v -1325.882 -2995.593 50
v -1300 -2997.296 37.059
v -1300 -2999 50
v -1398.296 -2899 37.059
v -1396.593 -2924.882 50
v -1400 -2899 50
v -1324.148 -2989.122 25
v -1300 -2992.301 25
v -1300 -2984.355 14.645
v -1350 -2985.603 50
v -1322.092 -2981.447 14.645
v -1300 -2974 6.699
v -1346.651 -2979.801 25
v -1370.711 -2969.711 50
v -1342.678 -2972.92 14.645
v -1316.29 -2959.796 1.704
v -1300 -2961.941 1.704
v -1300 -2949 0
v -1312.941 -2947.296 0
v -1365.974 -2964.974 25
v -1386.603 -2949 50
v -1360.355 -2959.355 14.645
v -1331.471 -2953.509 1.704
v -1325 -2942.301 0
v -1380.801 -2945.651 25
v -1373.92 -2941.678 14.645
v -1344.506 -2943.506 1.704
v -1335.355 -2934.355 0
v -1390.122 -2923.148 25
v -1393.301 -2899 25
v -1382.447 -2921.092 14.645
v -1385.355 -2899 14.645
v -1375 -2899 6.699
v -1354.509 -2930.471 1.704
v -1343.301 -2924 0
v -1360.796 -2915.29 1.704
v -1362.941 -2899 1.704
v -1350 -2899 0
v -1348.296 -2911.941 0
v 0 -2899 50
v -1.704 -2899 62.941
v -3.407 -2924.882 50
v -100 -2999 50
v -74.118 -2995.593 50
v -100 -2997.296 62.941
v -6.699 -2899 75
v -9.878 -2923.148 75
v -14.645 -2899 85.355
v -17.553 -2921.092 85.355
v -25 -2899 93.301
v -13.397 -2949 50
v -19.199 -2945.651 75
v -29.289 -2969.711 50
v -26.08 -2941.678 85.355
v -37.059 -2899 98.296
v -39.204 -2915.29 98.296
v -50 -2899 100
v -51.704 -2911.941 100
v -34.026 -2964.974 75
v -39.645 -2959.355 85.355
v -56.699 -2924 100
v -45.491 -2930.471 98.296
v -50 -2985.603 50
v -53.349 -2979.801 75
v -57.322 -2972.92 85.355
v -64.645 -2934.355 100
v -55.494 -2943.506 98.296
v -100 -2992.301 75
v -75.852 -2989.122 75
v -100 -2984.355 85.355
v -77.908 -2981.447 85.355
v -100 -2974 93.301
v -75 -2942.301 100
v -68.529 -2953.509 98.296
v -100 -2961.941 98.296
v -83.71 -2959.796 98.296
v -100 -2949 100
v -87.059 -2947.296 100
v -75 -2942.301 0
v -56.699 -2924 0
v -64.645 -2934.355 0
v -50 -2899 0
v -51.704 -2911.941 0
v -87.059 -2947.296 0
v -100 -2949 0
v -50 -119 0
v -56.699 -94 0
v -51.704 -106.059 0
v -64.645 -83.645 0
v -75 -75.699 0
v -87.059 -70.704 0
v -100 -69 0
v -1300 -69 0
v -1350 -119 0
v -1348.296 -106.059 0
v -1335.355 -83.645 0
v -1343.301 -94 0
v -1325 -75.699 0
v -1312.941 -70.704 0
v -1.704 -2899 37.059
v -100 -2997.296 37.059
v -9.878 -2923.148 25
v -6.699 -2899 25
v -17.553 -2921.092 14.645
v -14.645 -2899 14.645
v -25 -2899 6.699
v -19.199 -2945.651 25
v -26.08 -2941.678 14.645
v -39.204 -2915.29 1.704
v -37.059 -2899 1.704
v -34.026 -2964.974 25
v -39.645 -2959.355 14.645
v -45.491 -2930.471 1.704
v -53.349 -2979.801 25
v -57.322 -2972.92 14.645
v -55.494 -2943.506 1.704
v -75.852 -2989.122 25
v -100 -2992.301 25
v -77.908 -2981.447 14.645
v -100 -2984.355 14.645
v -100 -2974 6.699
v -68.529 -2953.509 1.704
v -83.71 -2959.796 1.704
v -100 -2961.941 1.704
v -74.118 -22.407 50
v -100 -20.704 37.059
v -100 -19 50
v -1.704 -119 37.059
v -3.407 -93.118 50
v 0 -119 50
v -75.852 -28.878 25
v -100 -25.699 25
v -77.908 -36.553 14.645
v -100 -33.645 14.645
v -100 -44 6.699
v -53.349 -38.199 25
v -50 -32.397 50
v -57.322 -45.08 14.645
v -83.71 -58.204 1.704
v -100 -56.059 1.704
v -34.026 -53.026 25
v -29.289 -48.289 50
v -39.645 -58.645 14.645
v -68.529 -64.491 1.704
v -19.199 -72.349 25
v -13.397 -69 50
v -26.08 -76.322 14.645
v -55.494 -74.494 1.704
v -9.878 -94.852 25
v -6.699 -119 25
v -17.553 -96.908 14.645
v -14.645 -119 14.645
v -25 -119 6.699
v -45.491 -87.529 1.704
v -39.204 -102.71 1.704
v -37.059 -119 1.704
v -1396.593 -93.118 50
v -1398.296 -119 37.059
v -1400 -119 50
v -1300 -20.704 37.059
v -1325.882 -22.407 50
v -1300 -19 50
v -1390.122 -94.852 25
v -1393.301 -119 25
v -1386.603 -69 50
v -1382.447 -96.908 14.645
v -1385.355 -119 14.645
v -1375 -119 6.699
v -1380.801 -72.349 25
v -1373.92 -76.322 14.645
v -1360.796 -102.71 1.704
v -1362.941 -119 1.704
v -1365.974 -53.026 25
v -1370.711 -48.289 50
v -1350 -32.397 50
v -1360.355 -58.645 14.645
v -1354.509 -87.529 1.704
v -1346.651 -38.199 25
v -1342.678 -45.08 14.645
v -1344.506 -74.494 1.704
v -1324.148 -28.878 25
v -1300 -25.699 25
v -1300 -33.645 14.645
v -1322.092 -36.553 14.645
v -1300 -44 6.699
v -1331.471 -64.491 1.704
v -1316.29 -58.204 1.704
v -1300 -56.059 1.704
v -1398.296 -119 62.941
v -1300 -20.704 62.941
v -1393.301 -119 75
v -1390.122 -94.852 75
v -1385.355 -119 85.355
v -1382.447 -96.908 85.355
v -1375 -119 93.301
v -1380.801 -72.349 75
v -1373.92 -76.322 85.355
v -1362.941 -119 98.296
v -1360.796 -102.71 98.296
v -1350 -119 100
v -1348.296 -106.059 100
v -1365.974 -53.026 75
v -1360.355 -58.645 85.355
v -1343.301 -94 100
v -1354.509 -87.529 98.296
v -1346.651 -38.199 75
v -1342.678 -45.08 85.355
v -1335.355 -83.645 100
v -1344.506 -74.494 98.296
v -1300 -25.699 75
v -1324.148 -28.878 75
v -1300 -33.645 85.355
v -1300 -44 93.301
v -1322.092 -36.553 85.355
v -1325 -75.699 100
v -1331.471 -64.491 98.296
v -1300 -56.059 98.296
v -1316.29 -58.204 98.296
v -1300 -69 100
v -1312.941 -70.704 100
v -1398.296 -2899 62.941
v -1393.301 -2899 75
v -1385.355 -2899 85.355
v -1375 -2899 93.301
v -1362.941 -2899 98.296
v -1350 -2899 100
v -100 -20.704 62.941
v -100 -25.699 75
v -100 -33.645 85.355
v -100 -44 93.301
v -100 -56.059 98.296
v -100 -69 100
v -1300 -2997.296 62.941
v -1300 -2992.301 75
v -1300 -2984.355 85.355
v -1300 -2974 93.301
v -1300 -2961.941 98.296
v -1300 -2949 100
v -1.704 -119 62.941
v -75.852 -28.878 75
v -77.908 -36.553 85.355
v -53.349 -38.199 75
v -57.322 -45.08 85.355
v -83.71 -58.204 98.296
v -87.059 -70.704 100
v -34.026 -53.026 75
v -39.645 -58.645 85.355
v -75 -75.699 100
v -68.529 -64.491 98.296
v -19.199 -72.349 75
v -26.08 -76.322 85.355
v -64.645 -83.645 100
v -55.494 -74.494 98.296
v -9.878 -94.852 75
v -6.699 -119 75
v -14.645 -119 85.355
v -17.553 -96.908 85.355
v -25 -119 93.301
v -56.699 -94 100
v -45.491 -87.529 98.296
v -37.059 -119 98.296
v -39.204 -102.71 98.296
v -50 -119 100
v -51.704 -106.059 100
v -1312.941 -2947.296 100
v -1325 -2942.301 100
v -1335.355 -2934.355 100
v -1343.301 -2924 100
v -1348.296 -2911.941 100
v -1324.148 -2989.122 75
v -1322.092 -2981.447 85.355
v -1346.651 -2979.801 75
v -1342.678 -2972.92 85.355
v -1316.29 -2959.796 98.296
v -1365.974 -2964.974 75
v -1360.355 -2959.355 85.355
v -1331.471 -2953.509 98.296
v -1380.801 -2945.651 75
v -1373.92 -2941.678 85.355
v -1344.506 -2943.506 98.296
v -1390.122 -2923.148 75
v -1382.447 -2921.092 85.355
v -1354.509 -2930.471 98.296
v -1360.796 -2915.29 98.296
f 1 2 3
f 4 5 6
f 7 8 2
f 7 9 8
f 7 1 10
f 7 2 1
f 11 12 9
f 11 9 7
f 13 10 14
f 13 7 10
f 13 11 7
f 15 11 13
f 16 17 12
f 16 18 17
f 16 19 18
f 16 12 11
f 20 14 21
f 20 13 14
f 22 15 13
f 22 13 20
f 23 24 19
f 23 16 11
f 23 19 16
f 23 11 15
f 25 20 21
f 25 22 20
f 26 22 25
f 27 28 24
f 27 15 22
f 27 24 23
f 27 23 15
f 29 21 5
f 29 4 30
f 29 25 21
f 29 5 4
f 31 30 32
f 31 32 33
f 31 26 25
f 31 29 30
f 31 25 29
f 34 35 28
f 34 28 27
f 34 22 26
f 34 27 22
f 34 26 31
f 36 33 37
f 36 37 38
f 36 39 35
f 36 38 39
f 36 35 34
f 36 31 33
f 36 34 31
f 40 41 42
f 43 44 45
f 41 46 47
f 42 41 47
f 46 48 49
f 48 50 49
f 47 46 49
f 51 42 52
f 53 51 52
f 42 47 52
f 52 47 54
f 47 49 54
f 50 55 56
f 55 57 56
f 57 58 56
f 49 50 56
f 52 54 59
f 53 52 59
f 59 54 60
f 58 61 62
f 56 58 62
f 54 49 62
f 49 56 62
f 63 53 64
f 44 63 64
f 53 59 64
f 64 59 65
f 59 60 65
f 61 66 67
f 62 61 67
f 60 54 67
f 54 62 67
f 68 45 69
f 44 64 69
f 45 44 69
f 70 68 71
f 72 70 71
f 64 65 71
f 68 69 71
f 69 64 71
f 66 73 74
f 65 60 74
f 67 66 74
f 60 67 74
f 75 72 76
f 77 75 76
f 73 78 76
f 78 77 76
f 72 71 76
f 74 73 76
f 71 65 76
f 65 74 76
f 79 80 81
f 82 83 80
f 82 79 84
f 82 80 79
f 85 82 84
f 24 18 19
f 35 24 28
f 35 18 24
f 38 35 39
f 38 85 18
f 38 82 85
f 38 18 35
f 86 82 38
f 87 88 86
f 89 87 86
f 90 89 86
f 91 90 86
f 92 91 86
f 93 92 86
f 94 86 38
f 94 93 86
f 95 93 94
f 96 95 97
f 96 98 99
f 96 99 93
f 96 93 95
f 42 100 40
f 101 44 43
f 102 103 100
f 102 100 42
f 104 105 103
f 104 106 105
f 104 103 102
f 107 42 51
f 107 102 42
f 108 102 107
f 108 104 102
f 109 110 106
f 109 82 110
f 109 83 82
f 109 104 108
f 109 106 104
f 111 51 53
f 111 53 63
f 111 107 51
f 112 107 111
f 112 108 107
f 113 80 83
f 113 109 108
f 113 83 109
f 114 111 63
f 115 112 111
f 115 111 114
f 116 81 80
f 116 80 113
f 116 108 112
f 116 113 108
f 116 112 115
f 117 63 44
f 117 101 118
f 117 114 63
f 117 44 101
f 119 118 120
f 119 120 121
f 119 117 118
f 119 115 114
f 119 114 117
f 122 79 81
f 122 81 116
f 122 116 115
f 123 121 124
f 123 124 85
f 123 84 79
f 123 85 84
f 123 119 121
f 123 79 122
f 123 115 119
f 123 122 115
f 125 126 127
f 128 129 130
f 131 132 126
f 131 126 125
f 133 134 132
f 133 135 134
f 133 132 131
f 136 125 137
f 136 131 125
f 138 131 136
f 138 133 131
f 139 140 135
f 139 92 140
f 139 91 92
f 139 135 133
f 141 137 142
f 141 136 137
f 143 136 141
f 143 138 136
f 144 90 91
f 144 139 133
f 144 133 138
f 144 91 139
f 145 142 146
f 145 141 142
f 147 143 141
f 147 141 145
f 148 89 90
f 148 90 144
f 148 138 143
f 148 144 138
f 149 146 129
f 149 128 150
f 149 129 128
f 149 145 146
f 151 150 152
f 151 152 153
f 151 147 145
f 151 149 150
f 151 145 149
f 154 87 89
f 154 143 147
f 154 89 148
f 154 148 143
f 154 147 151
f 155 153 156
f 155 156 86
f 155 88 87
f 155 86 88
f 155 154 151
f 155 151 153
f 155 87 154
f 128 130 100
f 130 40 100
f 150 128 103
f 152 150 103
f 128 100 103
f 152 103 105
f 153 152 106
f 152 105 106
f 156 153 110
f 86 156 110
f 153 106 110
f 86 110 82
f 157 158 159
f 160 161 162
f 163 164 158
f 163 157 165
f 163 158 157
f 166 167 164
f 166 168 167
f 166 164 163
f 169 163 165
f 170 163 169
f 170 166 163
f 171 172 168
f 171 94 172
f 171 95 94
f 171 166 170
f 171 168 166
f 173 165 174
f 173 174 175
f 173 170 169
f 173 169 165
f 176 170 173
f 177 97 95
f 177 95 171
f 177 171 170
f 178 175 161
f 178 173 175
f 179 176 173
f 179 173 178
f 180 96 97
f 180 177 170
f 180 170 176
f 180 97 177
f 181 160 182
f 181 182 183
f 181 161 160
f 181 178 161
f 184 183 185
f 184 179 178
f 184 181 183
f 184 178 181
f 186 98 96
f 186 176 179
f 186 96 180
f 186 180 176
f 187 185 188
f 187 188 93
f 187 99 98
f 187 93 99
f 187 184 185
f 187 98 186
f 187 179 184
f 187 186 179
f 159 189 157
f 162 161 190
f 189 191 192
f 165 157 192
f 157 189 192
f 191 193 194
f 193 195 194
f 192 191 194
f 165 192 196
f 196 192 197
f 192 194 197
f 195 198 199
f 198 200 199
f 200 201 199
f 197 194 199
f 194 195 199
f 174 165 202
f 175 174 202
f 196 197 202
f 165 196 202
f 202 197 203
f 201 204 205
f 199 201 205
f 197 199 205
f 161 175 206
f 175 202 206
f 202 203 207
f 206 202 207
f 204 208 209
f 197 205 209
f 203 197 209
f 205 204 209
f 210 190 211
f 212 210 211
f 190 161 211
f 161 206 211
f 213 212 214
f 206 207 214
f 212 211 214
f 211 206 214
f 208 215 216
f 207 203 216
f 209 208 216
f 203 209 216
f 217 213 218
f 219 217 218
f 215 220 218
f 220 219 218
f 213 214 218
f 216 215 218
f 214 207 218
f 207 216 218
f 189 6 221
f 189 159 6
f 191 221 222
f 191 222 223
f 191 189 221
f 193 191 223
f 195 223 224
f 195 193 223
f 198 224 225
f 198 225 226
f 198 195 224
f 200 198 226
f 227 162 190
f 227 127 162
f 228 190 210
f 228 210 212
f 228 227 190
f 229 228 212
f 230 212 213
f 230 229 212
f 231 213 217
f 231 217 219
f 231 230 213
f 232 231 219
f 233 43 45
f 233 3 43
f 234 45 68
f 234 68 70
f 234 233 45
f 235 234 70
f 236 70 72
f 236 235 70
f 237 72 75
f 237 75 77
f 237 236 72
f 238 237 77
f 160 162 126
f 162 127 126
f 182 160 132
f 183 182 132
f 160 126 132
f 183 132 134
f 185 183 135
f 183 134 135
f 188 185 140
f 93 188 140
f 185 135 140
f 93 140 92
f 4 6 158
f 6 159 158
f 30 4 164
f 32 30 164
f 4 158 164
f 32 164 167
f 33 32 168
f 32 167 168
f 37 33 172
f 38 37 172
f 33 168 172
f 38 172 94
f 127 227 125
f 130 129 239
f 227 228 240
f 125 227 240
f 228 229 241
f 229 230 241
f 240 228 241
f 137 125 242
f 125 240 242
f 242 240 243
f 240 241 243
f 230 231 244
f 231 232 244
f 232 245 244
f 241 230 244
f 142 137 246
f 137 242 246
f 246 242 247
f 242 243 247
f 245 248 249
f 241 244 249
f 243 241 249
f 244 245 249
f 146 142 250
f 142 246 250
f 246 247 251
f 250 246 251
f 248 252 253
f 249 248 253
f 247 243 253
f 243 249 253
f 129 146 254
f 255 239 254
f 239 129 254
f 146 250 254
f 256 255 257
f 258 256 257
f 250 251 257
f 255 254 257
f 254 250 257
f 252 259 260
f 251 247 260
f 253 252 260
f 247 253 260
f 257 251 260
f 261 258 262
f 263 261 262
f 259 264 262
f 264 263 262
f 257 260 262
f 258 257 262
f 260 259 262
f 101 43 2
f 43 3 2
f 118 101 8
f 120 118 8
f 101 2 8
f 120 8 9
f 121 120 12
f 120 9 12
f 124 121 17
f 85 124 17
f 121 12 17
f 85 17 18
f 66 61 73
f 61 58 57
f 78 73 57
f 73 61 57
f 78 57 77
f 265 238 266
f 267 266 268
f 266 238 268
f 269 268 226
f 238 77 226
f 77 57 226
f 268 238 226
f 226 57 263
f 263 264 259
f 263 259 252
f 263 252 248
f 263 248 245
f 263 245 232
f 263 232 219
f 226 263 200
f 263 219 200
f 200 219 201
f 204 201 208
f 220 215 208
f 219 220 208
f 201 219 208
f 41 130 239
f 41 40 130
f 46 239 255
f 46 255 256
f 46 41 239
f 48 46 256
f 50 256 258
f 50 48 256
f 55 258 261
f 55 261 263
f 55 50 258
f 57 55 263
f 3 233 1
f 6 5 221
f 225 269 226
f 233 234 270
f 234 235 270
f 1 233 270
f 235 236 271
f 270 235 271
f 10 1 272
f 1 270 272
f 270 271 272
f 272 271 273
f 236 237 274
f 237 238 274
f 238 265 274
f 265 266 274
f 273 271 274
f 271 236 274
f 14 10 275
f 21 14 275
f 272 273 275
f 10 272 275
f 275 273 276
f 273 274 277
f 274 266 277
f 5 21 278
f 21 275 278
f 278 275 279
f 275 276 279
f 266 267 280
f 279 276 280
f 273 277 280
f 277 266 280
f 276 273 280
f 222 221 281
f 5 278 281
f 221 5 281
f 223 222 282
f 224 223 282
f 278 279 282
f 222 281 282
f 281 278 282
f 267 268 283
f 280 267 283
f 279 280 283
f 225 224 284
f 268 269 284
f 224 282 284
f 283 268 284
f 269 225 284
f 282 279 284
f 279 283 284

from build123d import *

# Parameters (mm, degrees)
BOSS_EXTRUDE1_DEPTH = 100
FILLET1_R           = 50


with BuildPart() as part:
    # Sketch1 → Boss-Extrude1 (new body)
    with BuildSketch(Plane.XY):
        with BuildLine():
            Line((-1300, -19), (-100, -19))
            ThreePointArc((-100, -19), (-29.289321881, -48.289321881), (0, -119))
            Line((0, -119), (0, -2899))
            ThreePointArc((0, -2899), (-29.289321881, -2969.710678119), (-100, -2999))
            Line((-100, -2999), (-1300, -2999))
            ThreePointArc((-1300, -2999), (-1370.710678119, -2969.710678119), (-1400, -2899))
            Line((-1400, -2899), (-1400, -119))
            ThreePointArc((-1400, -119), (-1370.710678119, -48.289321881), (-1300, -19))
        make_face()
    extrude(amount=BOSS_EXTRUDE1_DEPTH)

    # Fillet1
    fillet1_edges = [part.edges().sort_by_distance(p)[0] for p in [
        (-1370.710678119, -2969.710678119, 0),
        (-700, -2999, 0),
        (-29.289321881, -2969.710678119, 0),
        (0, -1509, 0),
        (-29.289321881, -48.289321881, 0),
        (-700, -19, 0),
        (-1370.710678119, -48.289321881, 0),
        (-1400, -1509, 0),
        (-1370.710678119, -2969.710678119, 100),
        (-700, -2999, 100),
        (-29.289321881, -2969.710678119, 100),
        (0, -1509, 100),
        (-29.289321881, -48.289321881, 100),
        (-700, -19, 100),
        (-1370.710678119, -48.289321881, 100),
        (-1400, -1509, 100),
    ]]
    fillet(fillet1_edges, radius=FILLET1_R - 0.0001)  # a hair under: the kernel refuses the full size


solid = part.part
